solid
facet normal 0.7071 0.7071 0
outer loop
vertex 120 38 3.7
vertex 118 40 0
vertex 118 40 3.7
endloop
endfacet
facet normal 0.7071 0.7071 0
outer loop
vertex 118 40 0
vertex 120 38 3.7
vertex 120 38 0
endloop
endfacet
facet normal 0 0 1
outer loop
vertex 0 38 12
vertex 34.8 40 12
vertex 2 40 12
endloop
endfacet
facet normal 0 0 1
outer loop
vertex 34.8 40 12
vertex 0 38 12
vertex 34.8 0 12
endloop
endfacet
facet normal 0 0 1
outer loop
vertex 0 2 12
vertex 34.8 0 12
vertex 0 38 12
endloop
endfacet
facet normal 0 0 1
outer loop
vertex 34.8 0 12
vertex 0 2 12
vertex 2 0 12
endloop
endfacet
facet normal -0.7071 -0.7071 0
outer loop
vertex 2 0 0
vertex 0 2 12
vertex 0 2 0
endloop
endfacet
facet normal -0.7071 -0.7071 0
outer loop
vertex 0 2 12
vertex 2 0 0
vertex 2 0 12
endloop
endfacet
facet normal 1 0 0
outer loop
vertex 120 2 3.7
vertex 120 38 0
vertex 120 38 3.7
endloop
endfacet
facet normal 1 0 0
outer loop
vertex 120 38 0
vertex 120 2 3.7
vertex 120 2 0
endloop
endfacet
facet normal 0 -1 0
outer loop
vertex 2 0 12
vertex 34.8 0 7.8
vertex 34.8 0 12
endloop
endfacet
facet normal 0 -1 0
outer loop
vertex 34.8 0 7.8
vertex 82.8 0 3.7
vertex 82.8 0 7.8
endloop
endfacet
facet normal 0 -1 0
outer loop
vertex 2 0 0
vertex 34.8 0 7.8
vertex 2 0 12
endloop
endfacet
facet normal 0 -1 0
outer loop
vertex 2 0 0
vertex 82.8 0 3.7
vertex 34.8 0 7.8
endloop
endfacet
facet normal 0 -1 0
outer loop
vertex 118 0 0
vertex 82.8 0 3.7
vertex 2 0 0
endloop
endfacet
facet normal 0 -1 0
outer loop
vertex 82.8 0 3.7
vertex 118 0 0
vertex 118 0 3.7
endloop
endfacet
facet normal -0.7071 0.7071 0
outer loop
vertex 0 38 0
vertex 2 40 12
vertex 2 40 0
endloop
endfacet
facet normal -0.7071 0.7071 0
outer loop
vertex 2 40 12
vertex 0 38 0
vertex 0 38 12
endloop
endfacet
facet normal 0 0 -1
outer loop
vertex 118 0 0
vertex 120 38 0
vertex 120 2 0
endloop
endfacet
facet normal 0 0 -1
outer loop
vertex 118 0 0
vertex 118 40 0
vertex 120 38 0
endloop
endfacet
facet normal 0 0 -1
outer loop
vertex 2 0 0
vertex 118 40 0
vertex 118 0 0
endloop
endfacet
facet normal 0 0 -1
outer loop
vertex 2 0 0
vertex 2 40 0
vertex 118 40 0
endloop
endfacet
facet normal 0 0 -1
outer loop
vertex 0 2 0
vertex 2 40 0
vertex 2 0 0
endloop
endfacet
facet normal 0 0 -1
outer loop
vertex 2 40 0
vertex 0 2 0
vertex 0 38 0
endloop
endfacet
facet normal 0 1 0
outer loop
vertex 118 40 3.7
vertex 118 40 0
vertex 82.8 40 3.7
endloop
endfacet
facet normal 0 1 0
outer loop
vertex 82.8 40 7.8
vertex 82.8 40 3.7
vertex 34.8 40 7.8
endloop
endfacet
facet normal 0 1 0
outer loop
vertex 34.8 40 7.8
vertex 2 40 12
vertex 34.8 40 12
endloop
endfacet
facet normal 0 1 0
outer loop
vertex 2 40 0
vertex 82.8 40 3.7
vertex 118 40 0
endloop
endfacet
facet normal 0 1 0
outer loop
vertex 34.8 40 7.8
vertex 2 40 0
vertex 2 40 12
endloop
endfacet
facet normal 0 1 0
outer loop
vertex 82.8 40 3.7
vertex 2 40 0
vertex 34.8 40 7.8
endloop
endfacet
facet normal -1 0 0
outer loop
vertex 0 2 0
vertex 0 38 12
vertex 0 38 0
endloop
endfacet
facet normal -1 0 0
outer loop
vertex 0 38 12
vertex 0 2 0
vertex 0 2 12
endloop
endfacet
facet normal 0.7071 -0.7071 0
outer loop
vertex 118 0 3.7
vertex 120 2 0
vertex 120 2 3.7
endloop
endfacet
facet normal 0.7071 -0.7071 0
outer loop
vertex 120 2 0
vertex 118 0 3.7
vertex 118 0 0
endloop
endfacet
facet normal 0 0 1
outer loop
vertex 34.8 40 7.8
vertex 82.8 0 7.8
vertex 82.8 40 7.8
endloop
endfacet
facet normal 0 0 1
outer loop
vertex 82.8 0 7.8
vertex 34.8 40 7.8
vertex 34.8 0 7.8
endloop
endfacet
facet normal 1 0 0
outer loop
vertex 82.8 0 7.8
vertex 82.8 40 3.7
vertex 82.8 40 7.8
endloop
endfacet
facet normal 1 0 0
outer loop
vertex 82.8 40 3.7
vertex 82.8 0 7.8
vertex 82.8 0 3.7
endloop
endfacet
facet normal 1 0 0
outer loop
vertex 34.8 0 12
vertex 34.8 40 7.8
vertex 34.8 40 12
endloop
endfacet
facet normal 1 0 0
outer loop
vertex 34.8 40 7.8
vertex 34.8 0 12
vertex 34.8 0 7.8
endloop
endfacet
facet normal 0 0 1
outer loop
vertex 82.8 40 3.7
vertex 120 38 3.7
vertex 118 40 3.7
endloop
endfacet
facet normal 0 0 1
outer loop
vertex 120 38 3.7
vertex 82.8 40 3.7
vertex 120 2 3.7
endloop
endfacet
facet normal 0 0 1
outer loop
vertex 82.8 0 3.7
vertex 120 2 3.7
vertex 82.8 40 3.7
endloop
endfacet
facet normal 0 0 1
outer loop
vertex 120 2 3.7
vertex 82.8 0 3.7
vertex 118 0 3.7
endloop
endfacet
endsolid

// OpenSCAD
$fn = 32;

// ----------------------------------------------------------------------
// Stepped bar: twostep, 120 x 40 x 12/3.7 mm
// ----------------------------------------------------------------------

// --- parameters (mm) ---
bar_l = 120;              // bar length, X
bar_w = 40;               // bar width, Y
plate_t = 12;             // thickness of the thick zone, Z
thin_t = 3.7;             // thickness of the thin zone
corner_c = 2;             // corner chamfer of the bar
step_cut = 8.3;           // material removed from the thin zone
stair1_x = 34.8;          // position of the first stair
stair2_x = 82.8;          // position of the second stair
mid_t = 7.8;              // thickness of the middle zone
depth_1 = 4.2;            // depth of cut 1 from the top face
depth_2 = 8.3;            // depth of cut 2 from the top face

profile = [[2, 0], [118, 0], [120, 2], [120, 38], [118, 40], [2, 40], [0, 38], [0, 2]];  // primary outline, 8 points, counter clockwise
void_1 = [[34.8, -1], [82.8, -1], [82.8, 41], [34.8, 41]];  // first stair, 4 points
void_2 = [[82.8, -1], [121, -1], [121, 41], [82.8, 41]];  // second stair, 4 points

// --- the one profile operation ---
difference() {
  linear_extrude(height = plate_t) polygon(points = profile);
  translate([0, 0, plate_t - depth_1])
    linear_extrude(height = depth_1 + 1) polygon(points = void_1);
  translate([0, 0, plate_t - depth_2])
    linear_extrude(height = depth_2 + 1) polygon(points = void_2);
}
